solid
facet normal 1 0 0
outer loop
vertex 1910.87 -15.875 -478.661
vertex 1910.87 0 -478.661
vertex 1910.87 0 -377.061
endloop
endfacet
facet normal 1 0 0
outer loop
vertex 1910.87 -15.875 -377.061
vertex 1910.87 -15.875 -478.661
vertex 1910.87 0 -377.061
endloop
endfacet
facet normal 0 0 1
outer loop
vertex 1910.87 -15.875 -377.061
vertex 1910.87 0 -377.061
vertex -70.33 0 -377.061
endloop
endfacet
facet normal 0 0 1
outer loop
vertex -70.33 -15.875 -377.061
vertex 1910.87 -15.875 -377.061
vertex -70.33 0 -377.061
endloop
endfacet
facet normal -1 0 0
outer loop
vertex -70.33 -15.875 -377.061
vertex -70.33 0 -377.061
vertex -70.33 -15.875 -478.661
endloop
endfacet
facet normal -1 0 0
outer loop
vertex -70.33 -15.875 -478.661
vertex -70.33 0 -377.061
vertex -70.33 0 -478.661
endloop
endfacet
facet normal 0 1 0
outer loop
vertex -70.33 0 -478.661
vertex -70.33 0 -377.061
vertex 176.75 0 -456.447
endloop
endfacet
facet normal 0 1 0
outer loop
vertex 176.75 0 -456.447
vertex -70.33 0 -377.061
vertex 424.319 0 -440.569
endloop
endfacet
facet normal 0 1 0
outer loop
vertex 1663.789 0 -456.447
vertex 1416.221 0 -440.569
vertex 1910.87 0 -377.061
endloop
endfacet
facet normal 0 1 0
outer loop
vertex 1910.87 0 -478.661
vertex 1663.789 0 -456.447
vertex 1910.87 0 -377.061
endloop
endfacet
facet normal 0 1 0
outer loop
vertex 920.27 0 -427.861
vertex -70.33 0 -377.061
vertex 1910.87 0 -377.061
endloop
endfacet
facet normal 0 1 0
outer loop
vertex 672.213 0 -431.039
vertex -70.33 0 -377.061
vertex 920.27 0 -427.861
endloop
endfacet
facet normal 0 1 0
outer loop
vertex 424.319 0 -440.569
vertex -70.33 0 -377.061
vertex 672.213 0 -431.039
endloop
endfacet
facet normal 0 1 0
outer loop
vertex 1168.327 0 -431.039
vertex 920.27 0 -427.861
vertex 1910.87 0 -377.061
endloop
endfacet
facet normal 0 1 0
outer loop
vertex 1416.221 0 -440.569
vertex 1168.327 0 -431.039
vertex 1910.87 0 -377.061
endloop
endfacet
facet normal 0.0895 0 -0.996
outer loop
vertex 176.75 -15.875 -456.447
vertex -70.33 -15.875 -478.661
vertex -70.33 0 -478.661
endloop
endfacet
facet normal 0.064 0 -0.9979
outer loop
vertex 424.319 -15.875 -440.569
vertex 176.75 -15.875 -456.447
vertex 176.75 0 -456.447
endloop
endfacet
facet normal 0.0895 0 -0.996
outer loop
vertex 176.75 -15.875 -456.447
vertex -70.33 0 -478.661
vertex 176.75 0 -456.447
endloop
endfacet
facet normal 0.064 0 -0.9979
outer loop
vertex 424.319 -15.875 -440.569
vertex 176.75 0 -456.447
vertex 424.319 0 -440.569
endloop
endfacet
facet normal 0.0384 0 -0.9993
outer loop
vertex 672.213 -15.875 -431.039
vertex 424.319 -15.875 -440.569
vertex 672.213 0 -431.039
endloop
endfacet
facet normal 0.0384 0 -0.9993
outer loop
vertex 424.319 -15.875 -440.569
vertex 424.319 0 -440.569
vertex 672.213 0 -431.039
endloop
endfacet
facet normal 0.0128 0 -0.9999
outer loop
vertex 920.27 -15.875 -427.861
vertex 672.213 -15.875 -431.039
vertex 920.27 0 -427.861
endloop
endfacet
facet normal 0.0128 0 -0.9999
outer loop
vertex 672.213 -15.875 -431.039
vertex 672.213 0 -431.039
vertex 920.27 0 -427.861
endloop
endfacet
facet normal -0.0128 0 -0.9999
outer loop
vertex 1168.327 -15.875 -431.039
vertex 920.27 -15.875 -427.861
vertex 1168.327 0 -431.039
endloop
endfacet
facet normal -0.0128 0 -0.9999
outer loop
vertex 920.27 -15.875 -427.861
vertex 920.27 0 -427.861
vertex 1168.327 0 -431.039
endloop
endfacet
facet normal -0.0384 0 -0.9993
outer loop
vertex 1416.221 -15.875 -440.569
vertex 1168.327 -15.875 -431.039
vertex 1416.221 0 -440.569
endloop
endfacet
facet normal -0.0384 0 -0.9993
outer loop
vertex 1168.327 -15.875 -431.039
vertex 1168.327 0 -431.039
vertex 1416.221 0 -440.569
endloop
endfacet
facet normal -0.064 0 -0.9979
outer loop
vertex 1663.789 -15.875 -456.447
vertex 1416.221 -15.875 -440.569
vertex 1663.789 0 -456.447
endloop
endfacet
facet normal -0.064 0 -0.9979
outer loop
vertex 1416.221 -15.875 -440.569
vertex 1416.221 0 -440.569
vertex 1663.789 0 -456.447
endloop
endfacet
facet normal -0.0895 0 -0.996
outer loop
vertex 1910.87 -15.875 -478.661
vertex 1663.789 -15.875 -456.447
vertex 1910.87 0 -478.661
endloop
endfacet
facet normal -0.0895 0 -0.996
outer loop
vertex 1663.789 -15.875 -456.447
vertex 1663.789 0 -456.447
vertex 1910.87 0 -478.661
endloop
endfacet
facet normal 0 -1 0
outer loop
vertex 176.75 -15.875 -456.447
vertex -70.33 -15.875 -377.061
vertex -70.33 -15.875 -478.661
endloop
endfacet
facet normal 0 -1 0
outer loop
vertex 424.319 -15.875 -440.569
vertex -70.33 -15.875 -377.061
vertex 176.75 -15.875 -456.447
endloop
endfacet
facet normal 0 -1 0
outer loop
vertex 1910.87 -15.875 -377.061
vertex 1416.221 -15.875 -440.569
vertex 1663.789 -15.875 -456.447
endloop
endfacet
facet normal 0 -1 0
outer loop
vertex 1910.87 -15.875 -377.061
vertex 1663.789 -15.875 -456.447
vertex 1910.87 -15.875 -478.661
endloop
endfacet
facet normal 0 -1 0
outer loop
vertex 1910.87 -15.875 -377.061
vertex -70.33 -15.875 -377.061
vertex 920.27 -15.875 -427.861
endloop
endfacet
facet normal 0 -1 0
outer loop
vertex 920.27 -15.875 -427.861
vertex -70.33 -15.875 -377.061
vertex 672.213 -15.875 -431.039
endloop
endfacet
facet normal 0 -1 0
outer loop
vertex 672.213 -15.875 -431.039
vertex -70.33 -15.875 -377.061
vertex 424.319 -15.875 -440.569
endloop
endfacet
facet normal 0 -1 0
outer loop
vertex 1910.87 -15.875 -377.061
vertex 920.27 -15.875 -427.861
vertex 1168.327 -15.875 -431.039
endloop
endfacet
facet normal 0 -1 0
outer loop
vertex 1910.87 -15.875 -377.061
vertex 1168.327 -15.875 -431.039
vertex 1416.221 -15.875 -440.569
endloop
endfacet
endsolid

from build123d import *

# Parameters (mm, degrees)
F1_DEPTH = 25.4
F4_DEPTH = 15.875


with BuildPart() as f1:
    # F0 (on Front) → F1 (new body)
    with BuildSketch(Plane.XZ):
        with BuildLine():
            Line((1860.5442472816, 17.4135072052), (-120.6557527184, 17.4135072052))
            Line((-120.6557527184, 17.4135072052), (-120.6557527184, -58.7864927948))
            ThreePointArc((-120.6557527184, -58.7864927948), (869.9442472816, -7.9864927948), (1860.5442472816, -58.7864927948))
            Line((1860.5442472816, -58.7864927948), (1860.5442472816, 17.4135072052))
        make_face()
    extrude(amount=F1_DEPTH)


with BuildPart() as f4:
    # F3 (on Front) → F4 (new body)
    with BuildSketch(Plane.XZ):
        with BuildLine():
            Line((1910.8698048711, -377.0609709263), (-70.3301951289, -377.0609709263))
            Line((-70.3301951289, -377.0609709263), (-70.3301951289, -478.6609709263))
            ThreePointArc((-70.3301951289, -478.6609709262), (920.2698048711, -427.8609709262), (1910.8698048711, -478.6609709262))
            Line((1910.8698048711, -478.6609709263), (1910.8698048711, -377.0609709263))
        make_face()
    extrude(amount=F4_DEPTH)


solid = f4.part
